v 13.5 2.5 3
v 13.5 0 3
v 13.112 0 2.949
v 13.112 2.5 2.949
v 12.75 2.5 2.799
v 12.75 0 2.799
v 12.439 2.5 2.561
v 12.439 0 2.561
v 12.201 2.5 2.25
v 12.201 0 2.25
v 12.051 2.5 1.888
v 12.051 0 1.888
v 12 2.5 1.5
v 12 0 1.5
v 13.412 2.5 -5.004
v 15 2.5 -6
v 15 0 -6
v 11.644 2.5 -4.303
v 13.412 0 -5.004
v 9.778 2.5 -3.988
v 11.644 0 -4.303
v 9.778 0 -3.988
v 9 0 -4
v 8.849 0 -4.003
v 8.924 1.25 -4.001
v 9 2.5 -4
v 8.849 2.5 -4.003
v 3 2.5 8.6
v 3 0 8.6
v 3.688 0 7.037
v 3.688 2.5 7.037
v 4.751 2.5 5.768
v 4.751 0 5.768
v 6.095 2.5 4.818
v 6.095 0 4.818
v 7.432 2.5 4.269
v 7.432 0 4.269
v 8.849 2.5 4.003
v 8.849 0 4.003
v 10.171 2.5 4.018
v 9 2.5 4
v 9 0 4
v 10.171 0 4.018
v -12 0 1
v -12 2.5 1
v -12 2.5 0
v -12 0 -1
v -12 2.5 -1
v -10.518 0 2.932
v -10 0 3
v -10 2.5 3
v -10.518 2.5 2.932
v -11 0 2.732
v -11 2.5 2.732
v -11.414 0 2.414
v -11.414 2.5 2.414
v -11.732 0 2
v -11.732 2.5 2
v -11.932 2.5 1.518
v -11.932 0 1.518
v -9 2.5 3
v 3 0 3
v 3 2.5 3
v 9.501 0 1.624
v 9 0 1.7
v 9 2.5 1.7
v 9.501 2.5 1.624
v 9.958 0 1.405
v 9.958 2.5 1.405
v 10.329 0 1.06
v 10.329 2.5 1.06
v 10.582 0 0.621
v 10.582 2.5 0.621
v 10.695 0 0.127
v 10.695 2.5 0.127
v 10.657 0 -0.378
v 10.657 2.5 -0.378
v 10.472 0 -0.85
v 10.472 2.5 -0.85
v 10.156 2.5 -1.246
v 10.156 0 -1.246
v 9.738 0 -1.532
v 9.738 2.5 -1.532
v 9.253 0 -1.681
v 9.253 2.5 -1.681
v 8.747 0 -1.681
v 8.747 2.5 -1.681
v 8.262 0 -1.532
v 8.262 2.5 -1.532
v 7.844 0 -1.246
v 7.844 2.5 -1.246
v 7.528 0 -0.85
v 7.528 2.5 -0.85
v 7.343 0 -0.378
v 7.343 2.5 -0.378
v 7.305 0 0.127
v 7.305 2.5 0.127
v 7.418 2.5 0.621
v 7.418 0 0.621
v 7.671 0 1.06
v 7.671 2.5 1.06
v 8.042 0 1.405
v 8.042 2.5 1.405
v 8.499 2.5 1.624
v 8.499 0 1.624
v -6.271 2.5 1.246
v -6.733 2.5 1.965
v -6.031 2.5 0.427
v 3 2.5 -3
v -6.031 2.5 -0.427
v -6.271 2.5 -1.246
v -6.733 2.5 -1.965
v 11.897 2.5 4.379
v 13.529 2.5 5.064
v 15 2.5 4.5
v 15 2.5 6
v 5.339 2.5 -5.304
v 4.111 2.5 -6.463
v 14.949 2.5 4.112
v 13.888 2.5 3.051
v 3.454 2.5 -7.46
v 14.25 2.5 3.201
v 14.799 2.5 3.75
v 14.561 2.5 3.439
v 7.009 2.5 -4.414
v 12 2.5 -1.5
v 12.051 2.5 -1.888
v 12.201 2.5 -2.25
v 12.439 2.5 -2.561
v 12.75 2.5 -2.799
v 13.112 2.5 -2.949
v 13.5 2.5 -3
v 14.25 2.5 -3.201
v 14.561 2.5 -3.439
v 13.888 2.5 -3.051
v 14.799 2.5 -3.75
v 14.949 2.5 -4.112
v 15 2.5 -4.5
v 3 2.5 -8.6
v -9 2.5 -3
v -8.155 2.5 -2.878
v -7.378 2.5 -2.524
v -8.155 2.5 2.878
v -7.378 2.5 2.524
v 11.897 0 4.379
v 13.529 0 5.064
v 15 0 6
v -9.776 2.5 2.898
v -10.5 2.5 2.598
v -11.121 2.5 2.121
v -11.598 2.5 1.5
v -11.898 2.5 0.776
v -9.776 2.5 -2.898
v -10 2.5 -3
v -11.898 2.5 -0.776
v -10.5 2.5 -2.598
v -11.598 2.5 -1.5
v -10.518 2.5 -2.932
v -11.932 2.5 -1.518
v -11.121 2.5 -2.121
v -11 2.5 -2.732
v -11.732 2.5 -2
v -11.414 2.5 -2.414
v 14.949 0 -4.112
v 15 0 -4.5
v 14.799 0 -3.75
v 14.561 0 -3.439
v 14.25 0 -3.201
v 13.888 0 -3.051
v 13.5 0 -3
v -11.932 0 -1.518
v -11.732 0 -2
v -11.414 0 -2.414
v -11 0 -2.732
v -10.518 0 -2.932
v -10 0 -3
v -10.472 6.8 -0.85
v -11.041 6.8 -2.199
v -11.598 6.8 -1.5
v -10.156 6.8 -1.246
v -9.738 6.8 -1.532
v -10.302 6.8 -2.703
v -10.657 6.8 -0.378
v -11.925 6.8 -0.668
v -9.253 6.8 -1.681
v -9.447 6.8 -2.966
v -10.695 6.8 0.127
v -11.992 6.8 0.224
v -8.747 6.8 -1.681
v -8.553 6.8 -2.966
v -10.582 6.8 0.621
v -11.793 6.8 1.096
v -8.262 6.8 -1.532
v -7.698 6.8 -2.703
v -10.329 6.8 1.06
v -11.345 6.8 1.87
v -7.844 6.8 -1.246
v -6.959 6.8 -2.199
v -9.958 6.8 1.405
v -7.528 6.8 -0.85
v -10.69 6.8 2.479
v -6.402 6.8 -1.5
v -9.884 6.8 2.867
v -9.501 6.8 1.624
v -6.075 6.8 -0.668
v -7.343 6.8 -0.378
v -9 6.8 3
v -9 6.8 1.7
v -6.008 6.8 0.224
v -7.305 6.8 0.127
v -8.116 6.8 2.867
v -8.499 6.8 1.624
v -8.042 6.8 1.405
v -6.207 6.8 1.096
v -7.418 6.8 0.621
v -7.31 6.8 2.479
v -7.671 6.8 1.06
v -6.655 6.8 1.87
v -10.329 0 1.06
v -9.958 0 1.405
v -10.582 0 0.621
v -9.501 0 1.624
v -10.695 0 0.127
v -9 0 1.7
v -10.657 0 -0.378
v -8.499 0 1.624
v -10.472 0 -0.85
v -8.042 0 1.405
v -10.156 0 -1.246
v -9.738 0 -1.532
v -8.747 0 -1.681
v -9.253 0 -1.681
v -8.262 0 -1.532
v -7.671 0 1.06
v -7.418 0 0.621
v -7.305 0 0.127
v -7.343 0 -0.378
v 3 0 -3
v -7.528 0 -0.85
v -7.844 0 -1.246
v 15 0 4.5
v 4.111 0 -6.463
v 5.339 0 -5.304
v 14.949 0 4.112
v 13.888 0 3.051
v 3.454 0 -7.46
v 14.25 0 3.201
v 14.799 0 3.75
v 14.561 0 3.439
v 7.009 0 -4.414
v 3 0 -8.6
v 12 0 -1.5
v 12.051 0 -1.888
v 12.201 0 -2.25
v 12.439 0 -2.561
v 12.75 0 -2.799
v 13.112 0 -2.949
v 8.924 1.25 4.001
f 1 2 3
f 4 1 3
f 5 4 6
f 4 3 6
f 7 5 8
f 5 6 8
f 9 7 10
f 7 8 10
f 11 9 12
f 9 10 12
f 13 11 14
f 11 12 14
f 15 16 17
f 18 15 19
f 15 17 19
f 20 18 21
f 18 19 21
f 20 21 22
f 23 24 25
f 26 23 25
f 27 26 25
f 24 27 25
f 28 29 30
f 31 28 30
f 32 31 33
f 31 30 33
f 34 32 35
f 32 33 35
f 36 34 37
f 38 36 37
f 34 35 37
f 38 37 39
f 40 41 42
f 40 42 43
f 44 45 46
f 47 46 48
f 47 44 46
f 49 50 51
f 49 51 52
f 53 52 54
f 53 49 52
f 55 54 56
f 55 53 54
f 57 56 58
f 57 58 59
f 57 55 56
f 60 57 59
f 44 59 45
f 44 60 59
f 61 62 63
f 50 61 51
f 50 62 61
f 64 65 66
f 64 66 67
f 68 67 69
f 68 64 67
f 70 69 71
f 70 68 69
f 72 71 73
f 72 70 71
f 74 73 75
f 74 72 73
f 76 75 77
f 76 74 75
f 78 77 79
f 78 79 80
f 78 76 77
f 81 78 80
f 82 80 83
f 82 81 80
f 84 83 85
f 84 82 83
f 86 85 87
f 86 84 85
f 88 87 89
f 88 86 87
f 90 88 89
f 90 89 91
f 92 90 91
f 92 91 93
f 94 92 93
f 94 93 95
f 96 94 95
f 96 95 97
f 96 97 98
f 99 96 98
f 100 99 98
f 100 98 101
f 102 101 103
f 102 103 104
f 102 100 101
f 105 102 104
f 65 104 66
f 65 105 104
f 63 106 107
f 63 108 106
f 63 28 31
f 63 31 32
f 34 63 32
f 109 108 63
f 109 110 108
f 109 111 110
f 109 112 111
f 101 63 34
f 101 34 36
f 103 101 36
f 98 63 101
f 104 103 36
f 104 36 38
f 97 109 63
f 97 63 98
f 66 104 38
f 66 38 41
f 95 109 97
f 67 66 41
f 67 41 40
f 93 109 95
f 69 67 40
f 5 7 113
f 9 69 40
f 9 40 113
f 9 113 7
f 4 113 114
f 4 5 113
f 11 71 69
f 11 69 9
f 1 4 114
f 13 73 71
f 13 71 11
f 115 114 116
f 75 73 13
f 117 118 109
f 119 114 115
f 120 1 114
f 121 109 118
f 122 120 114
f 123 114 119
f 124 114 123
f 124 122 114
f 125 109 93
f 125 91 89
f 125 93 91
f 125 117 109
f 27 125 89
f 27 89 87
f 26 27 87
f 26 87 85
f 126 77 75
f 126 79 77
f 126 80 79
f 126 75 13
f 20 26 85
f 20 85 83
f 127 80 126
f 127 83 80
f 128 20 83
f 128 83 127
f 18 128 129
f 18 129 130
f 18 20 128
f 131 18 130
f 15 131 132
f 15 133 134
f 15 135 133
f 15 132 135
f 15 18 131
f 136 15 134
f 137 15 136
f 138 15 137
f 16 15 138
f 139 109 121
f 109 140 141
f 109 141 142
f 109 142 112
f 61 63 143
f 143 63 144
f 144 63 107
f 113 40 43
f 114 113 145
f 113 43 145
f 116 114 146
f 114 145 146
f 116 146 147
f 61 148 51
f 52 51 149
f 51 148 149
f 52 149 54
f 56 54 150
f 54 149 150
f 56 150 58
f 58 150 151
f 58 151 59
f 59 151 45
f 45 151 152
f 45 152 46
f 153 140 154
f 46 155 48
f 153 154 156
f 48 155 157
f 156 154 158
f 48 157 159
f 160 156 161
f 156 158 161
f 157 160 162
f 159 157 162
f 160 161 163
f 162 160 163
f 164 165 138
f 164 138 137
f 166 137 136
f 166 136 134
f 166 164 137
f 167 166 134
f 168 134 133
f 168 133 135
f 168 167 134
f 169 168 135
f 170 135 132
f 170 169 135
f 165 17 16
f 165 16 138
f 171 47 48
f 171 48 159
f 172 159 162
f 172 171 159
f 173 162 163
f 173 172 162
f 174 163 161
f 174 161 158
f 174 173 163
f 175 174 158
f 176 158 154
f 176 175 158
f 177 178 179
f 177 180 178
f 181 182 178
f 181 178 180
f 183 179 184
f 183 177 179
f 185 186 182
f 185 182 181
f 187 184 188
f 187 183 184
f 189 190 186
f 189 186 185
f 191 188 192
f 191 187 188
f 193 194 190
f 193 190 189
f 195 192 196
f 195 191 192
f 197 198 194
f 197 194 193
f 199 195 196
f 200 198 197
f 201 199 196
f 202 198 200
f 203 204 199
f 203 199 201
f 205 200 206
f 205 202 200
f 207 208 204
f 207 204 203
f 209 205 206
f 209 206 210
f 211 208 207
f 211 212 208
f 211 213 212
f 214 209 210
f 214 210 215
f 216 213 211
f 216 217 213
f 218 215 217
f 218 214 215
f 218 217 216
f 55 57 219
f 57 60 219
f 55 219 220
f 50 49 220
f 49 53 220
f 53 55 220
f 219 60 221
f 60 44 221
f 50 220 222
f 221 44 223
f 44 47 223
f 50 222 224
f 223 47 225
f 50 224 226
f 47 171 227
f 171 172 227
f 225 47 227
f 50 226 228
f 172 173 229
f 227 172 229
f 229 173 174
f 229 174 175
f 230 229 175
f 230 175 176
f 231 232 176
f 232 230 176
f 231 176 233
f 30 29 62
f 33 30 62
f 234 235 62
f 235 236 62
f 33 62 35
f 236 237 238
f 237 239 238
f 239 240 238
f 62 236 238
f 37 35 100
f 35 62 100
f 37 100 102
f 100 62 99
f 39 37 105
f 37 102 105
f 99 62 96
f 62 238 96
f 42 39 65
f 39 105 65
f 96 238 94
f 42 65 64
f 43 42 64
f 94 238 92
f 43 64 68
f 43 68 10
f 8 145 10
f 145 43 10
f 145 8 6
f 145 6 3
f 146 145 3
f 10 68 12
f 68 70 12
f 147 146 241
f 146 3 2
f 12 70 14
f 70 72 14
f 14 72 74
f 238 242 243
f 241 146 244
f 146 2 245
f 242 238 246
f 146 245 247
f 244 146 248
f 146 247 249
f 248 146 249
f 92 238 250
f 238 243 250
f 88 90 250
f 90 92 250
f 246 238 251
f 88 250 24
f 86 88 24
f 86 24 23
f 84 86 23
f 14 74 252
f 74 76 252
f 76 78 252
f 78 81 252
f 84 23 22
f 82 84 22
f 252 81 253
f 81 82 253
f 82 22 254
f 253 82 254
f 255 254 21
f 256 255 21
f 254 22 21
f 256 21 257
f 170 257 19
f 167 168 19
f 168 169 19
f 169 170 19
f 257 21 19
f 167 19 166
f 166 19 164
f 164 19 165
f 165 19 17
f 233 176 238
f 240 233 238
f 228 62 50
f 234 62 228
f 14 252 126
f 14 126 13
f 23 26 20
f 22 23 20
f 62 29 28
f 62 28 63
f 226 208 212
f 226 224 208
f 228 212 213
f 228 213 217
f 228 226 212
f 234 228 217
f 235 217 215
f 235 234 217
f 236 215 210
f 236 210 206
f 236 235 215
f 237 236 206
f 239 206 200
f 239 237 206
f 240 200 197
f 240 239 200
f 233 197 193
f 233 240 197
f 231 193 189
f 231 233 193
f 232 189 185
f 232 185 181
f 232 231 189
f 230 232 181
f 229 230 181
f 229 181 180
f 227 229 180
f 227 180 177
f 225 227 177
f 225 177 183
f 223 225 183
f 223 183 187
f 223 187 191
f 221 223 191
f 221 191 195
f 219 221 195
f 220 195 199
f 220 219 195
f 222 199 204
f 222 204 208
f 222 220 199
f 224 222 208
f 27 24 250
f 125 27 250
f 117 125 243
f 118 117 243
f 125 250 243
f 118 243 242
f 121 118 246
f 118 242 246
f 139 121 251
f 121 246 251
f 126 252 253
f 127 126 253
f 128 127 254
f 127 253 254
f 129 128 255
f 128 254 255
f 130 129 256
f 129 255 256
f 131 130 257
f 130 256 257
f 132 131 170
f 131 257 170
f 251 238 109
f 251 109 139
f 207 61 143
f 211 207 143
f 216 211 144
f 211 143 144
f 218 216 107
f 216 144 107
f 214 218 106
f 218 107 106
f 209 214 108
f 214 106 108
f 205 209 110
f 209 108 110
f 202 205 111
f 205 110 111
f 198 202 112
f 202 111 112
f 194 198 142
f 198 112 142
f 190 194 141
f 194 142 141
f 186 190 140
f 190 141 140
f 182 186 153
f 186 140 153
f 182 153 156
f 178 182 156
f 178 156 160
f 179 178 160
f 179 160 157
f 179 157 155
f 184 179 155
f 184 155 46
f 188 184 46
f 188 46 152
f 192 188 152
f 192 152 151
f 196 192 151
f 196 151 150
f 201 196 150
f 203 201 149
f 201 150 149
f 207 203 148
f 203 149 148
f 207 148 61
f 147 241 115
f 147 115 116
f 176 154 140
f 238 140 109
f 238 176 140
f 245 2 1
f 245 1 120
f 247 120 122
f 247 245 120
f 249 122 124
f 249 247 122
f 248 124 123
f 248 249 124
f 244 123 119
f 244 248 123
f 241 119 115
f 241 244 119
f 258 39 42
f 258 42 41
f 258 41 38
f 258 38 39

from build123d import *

# Parameters (mm, degrees)
SKETCH_1_R          = 1.7
EXTRUDE_1_DEPTH     = 2.5
SKETCH_3_R          = 3
SKETCH_3_R_2        = 1.7
EXTRUDE_2_DEPTH     = 4.3
EXTRUDE_3_DEPTH     = 2.5
EXTRUDE_4_DEPTH     = 2.5
CUT_EXTRUDE_2_DEPTH = 10
EXTRUDE_6_DEPTH     = 2.5
FILLET_START        = -1
FILLET_1_DEPTH      = 3.5
FILLET_1_2_DEPTH    = 2.5


with BuildPart() as part:
    # 草图1 → 凸台-拉伸1 (new body)
    with BuildSketch(Plane(origin=(0, 0, 0), x_dir=(1, 0, 0), z_dir=(0, 1, 0))):
        with BuildLine():
            Line((-10, 3), (10, 3))
            ThreePointArc((10, 3), (11.414213562, 2.414213562), (12, 1))
            Line((12, 1), (12, -1))
            ThreePointArc((12, -1), (11.414213562, -2.414213562), (10, -3))
            Line((10, -3), (-10, -3))
            ThreePointArc((-10, -3), (-11.414213562, -2.414213562), (-12, -1))
            Line((-12, -1), (-12, 1))
            ThreePointArc((-12, 1), (-11.414213562, 2.414213562), (-10, 3))
        make_face()
        with Locations(Location((-9, 0, 0), (0, 0, 270))):
            Circle(SKETCH_1_R, mode=Mode.SUBTRACT)
        with Locations(Location((9, 0, 0), (0, 0, 270))):
            Circle(SKETCH_1_R, mode=Mode.SUBTRACT)
    extrude(amount=EXTRUDE_1_DEPTH)

    # 草图3 → 凸台-拉伸2 (add)
    with BuildSketch(Plane(origin=(0, 2.5, 0), x_dir=(1, 0, 0), z_dir=(0, 1, 0))):
        with Locations(Location((-9, 0, 0), (0, 0, 270))):
            Circle(SKETCH_3_R)
        with Locations(Location((-9, 0, 0), (0, 0, 270))):
            Circle(SKETCH_3_R_2, mode=Mode.SUBTRACT)
    extrude(amount=EXTRUDE_2_DEPTH)

    # 草图4 → 凸台-拉伸3 (add)
    with BuildSketch(Plane.XZ):
        with BuildLine():
            Line((3, -3), (3, -6))
            add(Edge.make_bspline(
                [(9, -4), (5.683772234, -4.051316702), (3, -6)],
                knots=[0, 0, 0, 1, 1, 1], degree=2))
            add(Edge.make_bspline(
                [(9, -4), (12.316227766, -4.051316702), (15, -6)],
                knots=[0, 0, 0, 1, 1, 1], degree=2))
            Line((15, -6), (15, -3))
            Line((15, -3), (3, -3))
        make_face()
        with BuildLine():
            Line((3, 3), (15, 3))
            Line((15, 3), (15, 6))
            add(Edge.make_bspline(
                [(9, 4), (12.316227766, 4.051316702), (15, 6)],
                knots=[0, 0, 0, 1, 1, 1], degree=2))
            add(Edge.make_bspline(
                [(9, 4), (5.683772234, 4.051316702), (3, 6)],
                knots=[0, 0, 0, 1, 1, 1], degree=2))
            Line((3, 6), (3, 3))
        make_face()
    extrude(amount=-EXTRUDE_3_DEPTH)

    # 草图5 → 凸台-拉伸4 (add)
    with BuildSketch(Plane.XZ):
        Polygon((9.41538426, 3.145270203), (11.442509661, 0.357972777), (9.41538426, -3.078638254), (11.917617176, -3.601256521), (12, -3.235006375), (12, 3.620377719), align=None)
    extrude(amount=-EXTRUDE_4_DEPTH)

    # 草图10 → 切除-拉伸2 (cut)
    with BuildSketch(Plane.XZ):
        Polygon((9, 4), (14.708854471, 4.088341194), (15, 6), align=None)
        Polygon((9, -4), (14.512519064, -3.914696982), (15, -6), align=None)
    extrude(amount=-CUT_EXTRUDE_2_DEPTH, mode=Mode.SUBTRACT)

    # 草图11 → 凸台-拉伸6 (add)
    with BuildSketch(Plane.XZ):
        with BuildLine():
            Line((15, 6), (15, 3.4))
            Line((15, 3.4), (3, 3.4))
            Line((3, 3.4), (3, 8.6))
            add(Edge.make_bspline(
                [(3, 8.6), (3.743724888, 5.90317916), (8.383809549, 2.787162352), (13.287766409, 4.701526195), (15, 6)],
                knots=[0, 0, 0, 0, 0.541786912, 1, 1, 1, 1], degree=3))
        make_face()
        with BuildLine():
            Line((3, -8.6), (3, -3.580116595))
            Line((3, -3.580116595), (15, -3.580116595))
            Line((15, -3.580116595), (15, -6))
            add(Edge.make_bspline(
                [(15, -6), (13.28897523, -4.705122665), (8.381534555, -2.775849949), (3.754894418, -5.92427983), (3, -8.6)],
                knots=[0, 0, 0, 0, 0.458377401, 1, 1, 1, 1], degree=3))
        make_face()
    extrude(amount=-EXTRUDE_6_DEPTH)

    # 圆角1: read off the stored shape, not the designer's step
    # 圆角1 outline → 圆角1 (cut)
    with BuildSketch(Plane(origin=(0, 0, 0), x_dir=(1, 0, 0), z_dir=(0, 1, 0)).offset(FILLET_START)):
        with BuildLine():
            Line((15, -3), (13.5, -3))
            ThreePointArc((13.5, -3), (14.560660172, -3.439339828), (15, -4.5))
            Line((15, -4.5), (15, -3))
        make_face()
        with BuildLine():
            ThreePointArc((15, 4.5), (14.560660172, 3.439339828), (13.5, 3))
            Line((13.5, 3), (15, 3))
            Line((15, 3), (15, 4.5))
        make_face()
    extrude(amount=FILLET_1_DEPTH, mode=Mode.SUBTRACT)

    # Fillet 1 2 outline → Fillet 1 2 (add)
    with BuildSketch(Plane(origin=(0, 0, 0), x_dir=(1, 0, 0), z_dir=(0, 1, 0))):
        with BuildLine():
            ThreePointArc((13.5, -3), (12.439339828, -2.560660172), (12, -1.5))
            Line((12, -1.5), (12, -3))
            Line((12, -3), (13.5, -3))
        make_face()
        with BuildLine():
            ThreePointArc((12, 1.5), (12.439339828, 2.560660172), (13.5, 3))
            Line((13.5, 3), (12, 3))
            Line((12, 3), (12, 1.5))
        make_face()
    extrude(amount=FILLET_1_2_DEPTH)


solid = part.part
